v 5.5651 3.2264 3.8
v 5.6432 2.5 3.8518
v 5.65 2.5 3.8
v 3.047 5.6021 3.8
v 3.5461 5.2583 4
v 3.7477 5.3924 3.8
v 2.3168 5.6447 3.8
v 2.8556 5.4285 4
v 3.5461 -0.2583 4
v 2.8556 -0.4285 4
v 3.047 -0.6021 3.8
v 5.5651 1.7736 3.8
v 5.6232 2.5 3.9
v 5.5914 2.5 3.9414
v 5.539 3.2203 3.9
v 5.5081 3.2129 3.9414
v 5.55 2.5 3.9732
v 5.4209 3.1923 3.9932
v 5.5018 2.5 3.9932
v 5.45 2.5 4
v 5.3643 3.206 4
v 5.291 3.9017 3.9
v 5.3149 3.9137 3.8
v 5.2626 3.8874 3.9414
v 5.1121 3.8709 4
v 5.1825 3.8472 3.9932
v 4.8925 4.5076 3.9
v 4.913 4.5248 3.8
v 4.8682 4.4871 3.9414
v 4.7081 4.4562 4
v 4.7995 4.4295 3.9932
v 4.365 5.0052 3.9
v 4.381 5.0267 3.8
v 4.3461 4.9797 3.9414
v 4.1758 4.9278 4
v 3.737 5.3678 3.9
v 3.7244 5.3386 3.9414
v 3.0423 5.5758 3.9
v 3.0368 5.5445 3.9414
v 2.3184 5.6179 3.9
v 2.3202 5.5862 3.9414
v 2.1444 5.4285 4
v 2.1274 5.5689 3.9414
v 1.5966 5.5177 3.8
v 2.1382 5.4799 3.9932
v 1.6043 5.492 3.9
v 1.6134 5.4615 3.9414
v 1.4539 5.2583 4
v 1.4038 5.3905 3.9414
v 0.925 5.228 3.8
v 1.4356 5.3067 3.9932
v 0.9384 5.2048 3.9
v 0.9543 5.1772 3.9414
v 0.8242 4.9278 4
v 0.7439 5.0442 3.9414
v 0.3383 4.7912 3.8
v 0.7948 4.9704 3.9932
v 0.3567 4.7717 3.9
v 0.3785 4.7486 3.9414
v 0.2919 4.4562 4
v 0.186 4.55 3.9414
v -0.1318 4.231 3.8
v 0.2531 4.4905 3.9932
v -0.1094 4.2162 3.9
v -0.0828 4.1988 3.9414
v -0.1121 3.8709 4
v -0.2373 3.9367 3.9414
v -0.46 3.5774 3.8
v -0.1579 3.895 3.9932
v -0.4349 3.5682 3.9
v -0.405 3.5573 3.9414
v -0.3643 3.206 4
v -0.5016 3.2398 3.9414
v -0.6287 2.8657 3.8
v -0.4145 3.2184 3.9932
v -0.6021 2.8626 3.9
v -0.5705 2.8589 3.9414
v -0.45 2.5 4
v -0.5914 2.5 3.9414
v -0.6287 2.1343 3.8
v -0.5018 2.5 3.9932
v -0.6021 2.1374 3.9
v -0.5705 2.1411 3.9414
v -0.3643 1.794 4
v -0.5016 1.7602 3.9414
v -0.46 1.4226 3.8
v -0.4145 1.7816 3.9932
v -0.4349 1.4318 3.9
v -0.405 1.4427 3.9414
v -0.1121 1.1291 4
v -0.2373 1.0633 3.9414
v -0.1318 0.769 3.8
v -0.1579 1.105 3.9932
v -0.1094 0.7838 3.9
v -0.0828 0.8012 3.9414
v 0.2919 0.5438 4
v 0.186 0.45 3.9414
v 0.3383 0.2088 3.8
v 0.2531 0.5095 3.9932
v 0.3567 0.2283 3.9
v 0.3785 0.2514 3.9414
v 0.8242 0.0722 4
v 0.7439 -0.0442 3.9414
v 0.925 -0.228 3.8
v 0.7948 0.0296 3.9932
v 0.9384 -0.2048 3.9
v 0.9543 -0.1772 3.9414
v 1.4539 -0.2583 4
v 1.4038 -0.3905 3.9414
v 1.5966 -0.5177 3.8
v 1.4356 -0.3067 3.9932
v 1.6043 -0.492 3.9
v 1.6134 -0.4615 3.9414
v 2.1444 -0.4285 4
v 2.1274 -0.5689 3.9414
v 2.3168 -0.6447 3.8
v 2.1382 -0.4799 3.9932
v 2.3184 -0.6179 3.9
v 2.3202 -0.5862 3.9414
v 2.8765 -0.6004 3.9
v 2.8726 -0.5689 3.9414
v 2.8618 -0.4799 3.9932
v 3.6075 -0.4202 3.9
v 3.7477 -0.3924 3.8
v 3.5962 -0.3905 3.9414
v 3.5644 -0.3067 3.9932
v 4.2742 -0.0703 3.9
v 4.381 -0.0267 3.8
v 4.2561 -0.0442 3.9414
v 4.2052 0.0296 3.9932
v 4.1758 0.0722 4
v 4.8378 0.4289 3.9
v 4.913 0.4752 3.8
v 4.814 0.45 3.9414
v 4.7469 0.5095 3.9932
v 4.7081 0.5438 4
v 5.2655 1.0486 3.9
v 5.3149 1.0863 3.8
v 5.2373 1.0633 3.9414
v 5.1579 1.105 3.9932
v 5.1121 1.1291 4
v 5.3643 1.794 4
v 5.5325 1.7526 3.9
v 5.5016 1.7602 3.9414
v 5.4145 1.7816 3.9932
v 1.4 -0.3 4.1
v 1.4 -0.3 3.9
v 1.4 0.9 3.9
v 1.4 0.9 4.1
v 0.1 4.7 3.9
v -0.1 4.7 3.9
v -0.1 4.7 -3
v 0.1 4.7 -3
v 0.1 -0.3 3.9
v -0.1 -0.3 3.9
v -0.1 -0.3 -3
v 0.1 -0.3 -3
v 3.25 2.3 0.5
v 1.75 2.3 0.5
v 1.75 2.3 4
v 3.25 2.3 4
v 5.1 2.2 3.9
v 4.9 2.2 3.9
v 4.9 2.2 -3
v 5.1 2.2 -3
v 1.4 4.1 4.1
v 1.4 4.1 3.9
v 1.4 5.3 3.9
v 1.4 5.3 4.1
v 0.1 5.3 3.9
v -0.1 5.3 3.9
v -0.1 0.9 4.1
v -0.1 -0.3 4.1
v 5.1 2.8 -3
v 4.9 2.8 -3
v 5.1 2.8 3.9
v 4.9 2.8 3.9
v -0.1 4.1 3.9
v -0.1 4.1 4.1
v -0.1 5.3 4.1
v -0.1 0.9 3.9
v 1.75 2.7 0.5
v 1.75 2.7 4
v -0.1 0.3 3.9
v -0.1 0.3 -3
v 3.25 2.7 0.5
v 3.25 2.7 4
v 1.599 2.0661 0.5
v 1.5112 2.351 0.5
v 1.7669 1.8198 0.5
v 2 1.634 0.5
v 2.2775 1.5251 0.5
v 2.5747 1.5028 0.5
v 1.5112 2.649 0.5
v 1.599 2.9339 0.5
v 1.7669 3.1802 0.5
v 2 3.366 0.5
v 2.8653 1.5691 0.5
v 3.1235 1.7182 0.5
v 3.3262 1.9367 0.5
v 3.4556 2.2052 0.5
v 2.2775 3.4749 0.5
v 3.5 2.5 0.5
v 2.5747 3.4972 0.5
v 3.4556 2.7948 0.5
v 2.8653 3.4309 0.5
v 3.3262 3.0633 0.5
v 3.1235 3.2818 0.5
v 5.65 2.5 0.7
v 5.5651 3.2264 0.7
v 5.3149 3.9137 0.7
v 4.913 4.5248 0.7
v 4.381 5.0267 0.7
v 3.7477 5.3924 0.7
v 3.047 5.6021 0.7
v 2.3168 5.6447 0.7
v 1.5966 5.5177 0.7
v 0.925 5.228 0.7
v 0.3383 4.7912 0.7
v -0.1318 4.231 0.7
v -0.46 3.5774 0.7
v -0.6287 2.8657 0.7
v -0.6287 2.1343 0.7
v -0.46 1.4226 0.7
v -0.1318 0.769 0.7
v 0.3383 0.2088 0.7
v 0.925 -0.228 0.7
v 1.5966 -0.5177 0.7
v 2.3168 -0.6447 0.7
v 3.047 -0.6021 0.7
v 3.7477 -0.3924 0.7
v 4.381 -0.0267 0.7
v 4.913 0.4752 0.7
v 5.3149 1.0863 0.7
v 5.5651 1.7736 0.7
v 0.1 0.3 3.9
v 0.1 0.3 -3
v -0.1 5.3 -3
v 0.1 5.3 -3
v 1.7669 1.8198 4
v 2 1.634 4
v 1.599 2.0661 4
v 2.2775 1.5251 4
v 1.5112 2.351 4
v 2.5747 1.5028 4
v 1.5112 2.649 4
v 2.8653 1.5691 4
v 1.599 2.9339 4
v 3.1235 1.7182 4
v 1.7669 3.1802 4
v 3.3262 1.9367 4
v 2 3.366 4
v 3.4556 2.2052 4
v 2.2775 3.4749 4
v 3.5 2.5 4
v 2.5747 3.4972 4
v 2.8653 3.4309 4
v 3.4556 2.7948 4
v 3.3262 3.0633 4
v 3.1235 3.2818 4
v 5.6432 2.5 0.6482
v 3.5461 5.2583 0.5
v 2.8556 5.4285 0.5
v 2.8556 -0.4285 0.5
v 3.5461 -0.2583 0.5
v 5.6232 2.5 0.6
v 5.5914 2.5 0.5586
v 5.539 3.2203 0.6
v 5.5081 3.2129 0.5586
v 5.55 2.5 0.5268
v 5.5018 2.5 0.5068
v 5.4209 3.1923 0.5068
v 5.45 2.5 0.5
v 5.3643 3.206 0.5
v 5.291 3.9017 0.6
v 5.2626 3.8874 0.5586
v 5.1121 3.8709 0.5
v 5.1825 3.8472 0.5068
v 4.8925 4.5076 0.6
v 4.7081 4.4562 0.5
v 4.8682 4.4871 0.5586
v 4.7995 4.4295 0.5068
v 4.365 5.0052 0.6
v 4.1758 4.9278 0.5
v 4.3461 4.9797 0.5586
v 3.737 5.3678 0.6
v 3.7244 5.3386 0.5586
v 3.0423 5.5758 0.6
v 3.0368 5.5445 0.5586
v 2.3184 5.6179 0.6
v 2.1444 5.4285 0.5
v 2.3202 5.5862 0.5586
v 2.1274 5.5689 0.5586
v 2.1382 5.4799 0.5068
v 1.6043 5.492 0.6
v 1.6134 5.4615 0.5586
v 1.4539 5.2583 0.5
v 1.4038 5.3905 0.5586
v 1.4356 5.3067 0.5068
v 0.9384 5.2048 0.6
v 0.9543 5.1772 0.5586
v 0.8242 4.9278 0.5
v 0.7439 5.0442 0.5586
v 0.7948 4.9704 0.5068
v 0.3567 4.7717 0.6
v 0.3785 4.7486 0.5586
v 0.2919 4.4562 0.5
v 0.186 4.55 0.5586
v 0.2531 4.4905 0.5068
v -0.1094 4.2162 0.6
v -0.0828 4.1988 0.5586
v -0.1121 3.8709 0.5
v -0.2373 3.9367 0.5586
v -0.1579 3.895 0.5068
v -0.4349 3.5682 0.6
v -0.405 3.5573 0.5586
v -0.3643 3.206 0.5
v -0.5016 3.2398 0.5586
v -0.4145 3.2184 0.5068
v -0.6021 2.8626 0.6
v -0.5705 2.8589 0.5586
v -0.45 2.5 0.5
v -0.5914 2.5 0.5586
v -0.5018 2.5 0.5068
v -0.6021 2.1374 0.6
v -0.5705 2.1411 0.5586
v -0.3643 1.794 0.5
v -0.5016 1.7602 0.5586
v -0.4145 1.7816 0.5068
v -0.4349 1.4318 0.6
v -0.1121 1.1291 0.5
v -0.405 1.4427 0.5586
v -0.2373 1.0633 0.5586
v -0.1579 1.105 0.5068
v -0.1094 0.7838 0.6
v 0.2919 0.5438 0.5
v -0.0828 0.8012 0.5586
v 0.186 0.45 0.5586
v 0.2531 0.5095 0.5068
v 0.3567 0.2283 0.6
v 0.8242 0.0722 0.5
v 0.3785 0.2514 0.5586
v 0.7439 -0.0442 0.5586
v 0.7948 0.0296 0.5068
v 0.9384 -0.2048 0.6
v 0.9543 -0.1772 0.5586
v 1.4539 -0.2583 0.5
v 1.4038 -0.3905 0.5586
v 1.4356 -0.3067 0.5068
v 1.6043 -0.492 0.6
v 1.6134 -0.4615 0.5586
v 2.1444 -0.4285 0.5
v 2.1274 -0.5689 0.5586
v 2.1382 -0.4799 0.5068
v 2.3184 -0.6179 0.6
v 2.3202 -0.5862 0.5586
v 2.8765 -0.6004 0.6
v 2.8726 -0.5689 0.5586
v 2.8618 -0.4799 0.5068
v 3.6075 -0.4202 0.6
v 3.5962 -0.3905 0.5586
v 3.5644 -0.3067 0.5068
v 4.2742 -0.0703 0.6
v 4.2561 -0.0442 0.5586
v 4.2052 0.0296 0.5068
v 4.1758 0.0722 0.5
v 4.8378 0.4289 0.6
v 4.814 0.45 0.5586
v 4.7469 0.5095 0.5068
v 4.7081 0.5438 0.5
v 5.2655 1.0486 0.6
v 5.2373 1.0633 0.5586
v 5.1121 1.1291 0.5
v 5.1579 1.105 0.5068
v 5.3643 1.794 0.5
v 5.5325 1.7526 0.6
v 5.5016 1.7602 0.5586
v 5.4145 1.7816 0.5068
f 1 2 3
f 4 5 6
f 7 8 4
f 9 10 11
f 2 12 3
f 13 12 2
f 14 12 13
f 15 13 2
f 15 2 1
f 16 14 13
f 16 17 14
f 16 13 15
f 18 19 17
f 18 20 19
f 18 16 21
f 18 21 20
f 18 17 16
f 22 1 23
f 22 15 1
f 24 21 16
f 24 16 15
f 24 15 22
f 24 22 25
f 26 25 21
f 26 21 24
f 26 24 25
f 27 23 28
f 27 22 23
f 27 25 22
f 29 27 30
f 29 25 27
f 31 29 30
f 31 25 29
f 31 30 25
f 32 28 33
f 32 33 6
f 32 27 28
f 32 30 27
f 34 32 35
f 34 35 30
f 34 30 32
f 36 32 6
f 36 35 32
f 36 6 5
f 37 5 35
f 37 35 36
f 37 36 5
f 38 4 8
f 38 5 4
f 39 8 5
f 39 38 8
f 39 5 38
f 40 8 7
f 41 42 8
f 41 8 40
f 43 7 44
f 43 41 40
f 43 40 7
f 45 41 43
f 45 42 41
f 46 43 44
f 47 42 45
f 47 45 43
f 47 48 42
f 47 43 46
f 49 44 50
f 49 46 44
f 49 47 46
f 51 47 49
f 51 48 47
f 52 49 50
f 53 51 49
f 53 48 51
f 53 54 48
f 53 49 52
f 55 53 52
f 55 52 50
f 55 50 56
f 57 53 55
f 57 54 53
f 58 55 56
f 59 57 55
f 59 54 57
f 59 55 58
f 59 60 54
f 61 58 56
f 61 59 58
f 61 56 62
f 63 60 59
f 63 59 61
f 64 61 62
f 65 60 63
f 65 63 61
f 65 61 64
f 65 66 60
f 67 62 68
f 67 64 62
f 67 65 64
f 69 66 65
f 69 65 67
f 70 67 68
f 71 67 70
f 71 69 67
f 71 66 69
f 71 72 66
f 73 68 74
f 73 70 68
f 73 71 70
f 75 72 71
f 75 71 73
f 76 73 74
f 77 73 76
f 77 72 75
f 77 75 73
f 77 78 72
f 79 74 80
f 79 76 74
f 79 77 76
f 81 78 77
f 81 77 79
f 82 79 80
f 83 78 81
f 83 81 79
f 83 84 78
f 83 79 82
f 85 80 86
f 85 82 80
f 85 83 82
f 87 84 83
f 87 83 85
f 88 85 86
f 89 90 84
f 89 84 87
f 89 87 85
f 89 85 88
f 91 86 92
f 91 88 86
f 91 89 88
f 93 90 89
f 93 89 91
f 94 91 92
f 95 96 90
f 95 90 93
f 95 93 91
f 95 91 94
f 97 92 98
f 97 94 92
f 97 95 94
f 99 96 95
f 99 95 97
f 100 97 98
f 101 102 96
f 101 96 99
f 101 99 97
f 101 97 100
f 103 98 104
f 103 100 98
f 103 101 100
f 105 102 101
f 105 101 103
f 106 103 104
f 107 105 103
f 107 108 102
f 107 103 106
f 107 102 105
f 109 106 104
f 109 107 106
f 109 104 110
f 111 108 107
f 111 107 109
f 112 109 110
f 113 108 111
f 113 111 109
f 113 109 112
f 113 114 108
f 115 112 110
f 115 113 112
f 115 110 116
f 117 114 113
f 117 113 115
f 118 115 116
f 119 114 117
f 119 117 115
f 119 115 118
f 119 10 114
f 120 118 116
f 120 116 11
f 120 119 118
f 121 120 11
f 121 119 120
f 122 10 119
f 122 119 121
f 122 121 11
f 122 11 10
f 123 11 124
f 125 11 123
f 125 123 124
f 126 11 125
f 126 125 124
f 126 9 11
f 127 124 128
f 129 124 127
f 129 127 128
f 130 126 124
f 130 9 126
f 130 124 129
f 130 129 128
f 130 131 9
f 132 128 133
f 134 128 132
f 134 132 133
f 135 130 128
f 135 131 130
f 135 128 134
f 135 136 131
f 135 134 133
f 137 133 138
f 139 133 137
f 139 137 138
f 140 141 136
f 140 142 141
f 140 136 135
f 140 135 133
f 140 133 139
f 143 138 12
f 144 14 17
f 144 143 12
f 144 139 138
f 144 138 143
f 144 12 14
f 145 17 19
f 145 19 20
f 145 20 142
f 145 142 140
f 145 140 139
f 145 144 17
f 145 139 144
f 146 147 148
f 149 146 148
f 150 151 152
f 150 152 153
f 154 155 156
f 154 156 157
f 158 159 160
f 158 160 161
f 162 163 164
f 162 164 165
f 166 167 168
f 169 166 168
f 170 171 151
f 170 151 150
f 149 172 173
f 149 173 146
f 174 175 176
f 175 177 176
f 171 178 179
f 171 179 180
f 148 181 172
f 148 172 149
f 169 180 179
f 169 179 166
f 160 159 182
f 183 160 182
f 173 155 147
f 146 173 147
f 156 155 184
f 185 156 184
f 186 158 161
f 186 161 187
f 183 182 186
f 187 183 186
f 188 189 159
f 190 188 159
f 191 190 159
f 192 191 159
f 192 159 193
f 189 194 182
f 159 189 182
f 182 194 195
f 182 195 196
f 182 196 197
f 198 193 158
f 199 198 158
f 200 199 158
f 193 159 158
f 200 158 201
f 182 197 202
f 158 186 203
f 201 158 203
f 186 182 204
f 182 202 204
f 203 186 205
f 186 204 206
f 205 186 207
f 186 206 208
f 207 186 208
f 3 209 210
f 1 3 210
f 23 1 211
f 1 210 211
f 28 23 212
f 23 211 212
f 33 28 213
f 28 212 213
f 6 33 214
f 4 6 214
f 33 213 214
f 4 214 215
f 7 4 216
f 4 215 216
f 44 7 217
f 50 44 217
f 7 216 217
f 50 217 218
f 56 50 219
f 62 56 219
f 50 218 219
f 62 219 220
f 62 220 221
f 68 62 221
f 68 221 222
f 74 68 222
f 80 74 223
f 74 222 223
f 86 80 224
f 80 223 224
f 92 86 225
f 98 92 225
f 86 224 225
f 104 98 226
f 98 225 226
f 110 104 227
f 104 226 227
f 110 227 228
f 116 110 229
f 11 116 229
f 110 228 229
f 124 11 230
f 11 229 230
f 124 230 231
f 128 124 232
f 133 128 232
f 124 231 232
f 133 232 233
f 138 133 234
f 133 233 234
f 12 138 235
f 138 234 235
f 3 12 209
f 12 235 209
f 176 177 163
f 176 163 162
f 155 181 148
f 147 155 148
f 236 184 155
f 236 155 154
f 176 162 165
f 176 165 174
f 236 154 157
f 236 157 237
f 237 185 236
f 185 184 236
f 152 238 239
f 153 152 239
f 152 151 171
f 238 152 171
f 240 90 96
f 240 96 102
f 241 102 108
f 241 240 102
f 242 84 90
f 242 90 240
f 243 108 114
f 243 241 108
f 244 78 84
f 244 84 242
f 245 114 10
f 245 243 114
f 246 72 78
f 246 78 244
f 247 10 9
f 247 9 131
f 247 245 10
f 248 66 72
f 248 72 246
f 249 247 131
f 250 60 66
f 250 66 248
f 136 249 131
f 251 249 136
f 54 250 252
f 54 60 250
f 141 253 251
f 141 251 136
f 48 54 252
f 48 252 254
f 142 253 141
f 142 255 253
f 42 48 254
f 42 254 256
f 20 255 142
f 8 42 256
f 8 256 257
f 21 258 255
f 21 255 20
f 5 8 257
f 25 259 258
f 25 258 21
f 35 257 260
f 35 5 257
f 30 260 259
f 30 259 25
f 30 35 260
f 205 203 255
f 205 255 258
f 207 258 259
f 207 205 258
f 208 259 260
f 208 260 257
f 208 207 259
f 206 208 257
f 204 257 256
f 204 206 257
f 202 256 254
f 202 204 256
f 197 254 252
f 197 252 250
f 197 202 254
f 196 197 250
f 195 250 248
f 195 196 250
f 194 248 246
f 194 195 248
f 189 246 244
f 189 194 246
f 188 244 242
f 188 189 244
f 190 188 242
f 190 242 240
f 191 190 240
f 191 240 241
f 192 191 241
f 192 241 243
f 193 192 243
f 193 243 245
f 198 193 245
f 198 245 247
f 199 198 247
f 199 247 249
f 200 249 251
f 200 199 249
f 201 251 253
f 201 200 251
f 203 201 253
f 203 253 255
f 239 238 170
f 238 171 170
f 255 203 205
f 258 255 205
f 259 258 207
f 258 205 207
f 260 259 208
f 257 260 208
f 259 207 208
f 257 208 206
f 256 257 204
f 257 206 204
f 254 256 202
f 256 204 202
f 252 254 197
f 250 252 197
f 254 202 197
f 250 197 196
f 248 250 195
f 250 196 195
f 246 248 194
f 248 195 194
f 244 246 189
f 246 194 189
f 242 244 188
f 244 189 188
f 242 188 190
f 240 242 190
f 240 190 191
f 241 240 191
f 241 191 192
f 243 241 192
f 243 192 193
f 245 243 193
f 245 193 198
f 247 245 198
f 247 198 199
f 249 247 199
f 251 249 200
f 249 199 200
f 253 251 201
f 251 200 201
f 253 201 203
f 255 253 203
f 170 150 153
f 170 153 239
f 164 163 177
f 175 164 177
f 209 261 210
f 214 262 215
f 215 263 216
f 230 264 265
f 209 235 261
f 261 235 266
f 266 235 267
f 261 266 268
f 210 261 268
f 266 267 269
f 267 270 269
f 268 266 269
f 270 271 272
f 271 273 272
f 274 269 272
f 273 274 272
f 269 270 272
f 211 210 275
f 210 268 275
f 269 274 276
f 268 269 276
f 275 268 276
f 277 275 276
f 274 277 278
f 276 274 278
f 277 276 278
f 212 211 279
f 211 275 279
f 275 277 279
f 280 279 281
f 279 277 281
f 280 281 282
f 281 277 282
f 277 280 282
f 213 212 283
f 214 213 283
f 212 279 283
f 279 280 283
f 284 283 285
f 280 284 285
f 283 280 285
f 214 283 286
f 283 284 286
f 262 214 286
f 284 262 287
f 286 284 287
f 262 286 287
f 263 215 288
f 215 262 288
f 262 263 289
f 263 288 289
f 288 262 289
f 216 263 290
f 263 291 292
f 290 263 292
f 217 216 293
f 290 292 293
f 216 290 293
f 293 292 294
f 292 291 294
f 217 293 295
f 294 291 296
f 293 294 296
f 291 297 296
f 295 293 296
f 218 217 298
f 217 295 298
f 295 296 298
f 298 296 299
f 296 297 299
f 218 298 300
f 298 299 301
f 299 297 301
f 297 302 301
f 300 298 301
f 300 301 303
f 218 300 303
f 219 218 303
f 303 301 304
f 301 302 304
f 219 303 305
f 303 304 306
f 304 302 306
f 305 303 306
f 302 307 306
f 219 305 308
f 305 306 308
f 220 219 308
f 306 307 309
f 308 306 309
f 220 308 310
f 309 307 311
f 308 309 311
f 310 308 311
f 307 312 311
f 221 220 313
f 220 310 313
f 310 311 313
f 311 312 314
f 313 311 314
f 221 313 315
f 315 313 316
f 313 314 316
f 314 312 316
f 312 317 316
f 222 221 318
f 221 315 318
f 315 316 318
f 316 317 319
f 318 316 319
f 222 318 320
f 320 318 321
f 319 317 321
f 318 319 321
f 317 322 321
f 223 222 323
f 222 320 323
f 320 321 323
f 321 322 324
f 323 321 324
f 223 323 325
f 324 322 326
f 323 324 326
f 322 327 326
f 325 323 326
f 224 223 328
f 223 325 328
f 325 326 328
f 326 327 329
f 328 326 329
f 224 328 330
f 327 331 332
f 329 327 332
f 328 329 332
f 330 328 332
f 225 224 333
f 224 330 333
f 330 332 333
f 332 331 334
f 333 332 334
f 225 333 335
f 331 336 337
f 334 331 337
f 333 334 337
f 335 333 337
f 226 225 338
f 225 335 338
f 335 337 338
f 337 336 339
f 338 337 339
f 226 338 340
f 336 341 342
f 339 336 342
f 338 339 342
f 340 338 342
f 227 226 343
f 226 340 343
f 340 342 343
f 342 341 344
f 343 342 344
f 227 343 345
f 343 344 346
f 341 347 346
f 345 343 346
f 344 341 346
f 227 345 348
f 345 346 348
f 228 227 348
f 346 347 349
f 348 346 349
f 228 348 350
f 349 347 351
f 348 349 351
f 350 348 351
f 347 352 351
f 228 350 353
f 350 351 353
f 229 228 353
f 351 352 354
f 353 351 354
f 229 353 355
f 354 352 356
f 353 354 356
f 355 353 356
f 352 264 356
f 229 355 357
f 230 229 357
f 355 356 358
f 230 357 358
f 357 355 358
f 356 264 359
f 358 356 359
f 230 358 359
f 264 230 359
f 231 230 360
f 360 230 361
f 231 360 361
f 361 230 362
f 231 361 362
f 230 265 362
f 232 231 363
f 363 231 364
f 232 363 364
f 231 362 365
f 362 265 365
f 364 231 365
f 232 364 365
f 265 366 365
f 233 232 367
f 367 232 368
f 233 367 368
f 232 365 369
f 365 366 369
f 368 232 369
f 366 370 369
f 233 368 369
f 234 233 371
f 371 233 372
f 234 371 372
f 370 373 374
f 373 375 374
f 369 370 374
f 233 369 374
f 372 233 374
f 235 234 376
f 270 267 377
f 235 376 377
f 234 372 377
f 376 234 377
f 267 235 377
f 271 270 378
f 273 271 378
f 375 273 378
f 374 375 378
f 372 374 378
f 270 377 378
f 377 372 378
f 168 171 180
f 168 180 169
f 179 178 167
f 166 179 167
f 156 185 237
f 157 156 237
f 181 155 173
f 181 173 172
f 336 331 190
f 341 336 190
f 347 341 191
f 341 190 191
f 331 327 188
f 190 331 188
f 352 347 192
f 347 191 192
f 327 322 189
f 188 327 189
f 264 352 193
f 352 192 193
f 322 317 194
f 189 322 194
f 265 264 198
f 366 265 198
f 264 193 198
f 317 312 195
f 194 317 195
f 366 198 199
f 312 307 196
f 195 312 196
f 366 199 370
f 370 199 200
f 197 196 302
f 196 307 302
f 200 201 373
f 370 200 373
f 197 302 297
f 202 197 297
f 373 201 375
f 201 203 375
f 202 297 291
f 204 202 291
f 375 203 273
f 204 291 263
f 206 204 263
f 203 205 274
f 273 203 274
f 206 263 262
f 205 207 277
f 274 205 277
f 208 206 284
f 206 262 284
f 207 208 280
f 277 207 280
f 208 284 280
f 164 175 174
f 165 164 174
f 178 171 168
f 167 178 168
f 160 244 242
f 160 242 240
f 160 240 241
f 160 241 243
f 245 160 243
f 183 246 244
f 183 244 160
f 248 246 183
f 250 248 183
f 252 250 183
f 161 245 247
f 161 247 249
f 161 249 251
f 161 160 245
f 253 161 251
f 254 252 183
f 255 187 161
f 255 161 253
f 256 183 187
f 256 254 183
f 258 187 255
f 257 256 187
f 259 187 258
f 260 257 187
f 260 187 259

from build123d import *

# Parameters (mm, degrees)
SKETCH003_W       = 0.2
SKETCH003_H       = 0.6
PAD002_DEPTH      = 3.9
PAD002_DEPTH_BACK = 3
SKETCH004_R       = 1
SKETCH004_W       = 1.5
SKETCH004_H       = 0.4
PAD003_DEPTH      = 3.5
SKETCH_R          = 3.15
SKETCH_R_2        = 1
PAD_DEPTH         = 3.5
FILLET_R          = 0.2
SKETCH005_W       = 1.5
SKETCH005_H       = 1.2
PAD004_DEPTH      = 0.2


with BuildPart() as pad002:
    # Sketch003 → Pad002 (new body, two sides)
    with BuildSketch(Plane(origin=(0, 5, 0), x_dir=(1, 0, 0), z_dir=(0, 0, 1))) as pad002_sk:
        Rectangle(SKETCH003_W, SKETCH003_H)
        with Locations((5, -2.5)):
            Rectangle(SKETCH003_W, SKETCH003_H)
        with Locations((0, -5)):
            Rectangle(SKETCH003_W, SKETCH003_H)
    extrude(amount=PAD002_DEPTH)
    extrude(pad002_sk.sketch, amount=-PAD002_DEPTH_BACK)


with BuildPart() as pad003:
    # Sketch004 → Pad003 (new body)
    with BuildSketch(Plane(origin=(0, 5, 0.5), x_dir=(1, 0, 0), z_dir=(0, 0, 1))):
        with Locations((2.5, -2.5)):
            Circle(SKETCH004_R)
        with Locations((2.5, -2.5)):
            Rectangle(SKETCH004_W, SKETCH004_H, mode=Mode.SUBTRACT)
    extrude(amount=PAD003_DEPTH)


with BuildPart() as fillet_body:
    # Sketch → Pad (new body)
    with BuildSketch(Plane(origin=(0, 5, 0.5), x_dir=(1, 0, 0), z_dir=(0, 0, 1))):
        with Locations((2.5, -2.5)):
            Circle(SKETCH_R)
        with Locations((2.5, -2.5)):
            Circle(SKETCH_R_2, mode=Mode.SUBTRACT)
    extrude(amount=PAD_DEPTH)

    # Fillet
    fillet_edges = [fillet_body.edges().sort_by_distance(p)[0] for p in [
        (-0.65, 2.5, 0.5),
        (-0.65, 2.5, 4),
    ]]
    fillet(fillet_edges, radius=FILLET_R)


with BuildPart() as pad004:
    # Sketch005 → Pad004 (new body)
    with BuildSketch(Plane(origin=(0, 5, 3.9), x_dir=(1, 0, 0), z_dir=(0, 0, 1))):
        with Locations((0.65, -0.3)):
            Rectangle(SKETCH005_W, SKETCH005_H)
        with Locations((0.65, -4.7)):
            Rectangle(SKETCH005_W, SKETCH005_H)
    extrude(amount=PAD004_DEPTH)


solid = Compound([pad002.part, pad003.part, fillet_body.part, pad004.part])
